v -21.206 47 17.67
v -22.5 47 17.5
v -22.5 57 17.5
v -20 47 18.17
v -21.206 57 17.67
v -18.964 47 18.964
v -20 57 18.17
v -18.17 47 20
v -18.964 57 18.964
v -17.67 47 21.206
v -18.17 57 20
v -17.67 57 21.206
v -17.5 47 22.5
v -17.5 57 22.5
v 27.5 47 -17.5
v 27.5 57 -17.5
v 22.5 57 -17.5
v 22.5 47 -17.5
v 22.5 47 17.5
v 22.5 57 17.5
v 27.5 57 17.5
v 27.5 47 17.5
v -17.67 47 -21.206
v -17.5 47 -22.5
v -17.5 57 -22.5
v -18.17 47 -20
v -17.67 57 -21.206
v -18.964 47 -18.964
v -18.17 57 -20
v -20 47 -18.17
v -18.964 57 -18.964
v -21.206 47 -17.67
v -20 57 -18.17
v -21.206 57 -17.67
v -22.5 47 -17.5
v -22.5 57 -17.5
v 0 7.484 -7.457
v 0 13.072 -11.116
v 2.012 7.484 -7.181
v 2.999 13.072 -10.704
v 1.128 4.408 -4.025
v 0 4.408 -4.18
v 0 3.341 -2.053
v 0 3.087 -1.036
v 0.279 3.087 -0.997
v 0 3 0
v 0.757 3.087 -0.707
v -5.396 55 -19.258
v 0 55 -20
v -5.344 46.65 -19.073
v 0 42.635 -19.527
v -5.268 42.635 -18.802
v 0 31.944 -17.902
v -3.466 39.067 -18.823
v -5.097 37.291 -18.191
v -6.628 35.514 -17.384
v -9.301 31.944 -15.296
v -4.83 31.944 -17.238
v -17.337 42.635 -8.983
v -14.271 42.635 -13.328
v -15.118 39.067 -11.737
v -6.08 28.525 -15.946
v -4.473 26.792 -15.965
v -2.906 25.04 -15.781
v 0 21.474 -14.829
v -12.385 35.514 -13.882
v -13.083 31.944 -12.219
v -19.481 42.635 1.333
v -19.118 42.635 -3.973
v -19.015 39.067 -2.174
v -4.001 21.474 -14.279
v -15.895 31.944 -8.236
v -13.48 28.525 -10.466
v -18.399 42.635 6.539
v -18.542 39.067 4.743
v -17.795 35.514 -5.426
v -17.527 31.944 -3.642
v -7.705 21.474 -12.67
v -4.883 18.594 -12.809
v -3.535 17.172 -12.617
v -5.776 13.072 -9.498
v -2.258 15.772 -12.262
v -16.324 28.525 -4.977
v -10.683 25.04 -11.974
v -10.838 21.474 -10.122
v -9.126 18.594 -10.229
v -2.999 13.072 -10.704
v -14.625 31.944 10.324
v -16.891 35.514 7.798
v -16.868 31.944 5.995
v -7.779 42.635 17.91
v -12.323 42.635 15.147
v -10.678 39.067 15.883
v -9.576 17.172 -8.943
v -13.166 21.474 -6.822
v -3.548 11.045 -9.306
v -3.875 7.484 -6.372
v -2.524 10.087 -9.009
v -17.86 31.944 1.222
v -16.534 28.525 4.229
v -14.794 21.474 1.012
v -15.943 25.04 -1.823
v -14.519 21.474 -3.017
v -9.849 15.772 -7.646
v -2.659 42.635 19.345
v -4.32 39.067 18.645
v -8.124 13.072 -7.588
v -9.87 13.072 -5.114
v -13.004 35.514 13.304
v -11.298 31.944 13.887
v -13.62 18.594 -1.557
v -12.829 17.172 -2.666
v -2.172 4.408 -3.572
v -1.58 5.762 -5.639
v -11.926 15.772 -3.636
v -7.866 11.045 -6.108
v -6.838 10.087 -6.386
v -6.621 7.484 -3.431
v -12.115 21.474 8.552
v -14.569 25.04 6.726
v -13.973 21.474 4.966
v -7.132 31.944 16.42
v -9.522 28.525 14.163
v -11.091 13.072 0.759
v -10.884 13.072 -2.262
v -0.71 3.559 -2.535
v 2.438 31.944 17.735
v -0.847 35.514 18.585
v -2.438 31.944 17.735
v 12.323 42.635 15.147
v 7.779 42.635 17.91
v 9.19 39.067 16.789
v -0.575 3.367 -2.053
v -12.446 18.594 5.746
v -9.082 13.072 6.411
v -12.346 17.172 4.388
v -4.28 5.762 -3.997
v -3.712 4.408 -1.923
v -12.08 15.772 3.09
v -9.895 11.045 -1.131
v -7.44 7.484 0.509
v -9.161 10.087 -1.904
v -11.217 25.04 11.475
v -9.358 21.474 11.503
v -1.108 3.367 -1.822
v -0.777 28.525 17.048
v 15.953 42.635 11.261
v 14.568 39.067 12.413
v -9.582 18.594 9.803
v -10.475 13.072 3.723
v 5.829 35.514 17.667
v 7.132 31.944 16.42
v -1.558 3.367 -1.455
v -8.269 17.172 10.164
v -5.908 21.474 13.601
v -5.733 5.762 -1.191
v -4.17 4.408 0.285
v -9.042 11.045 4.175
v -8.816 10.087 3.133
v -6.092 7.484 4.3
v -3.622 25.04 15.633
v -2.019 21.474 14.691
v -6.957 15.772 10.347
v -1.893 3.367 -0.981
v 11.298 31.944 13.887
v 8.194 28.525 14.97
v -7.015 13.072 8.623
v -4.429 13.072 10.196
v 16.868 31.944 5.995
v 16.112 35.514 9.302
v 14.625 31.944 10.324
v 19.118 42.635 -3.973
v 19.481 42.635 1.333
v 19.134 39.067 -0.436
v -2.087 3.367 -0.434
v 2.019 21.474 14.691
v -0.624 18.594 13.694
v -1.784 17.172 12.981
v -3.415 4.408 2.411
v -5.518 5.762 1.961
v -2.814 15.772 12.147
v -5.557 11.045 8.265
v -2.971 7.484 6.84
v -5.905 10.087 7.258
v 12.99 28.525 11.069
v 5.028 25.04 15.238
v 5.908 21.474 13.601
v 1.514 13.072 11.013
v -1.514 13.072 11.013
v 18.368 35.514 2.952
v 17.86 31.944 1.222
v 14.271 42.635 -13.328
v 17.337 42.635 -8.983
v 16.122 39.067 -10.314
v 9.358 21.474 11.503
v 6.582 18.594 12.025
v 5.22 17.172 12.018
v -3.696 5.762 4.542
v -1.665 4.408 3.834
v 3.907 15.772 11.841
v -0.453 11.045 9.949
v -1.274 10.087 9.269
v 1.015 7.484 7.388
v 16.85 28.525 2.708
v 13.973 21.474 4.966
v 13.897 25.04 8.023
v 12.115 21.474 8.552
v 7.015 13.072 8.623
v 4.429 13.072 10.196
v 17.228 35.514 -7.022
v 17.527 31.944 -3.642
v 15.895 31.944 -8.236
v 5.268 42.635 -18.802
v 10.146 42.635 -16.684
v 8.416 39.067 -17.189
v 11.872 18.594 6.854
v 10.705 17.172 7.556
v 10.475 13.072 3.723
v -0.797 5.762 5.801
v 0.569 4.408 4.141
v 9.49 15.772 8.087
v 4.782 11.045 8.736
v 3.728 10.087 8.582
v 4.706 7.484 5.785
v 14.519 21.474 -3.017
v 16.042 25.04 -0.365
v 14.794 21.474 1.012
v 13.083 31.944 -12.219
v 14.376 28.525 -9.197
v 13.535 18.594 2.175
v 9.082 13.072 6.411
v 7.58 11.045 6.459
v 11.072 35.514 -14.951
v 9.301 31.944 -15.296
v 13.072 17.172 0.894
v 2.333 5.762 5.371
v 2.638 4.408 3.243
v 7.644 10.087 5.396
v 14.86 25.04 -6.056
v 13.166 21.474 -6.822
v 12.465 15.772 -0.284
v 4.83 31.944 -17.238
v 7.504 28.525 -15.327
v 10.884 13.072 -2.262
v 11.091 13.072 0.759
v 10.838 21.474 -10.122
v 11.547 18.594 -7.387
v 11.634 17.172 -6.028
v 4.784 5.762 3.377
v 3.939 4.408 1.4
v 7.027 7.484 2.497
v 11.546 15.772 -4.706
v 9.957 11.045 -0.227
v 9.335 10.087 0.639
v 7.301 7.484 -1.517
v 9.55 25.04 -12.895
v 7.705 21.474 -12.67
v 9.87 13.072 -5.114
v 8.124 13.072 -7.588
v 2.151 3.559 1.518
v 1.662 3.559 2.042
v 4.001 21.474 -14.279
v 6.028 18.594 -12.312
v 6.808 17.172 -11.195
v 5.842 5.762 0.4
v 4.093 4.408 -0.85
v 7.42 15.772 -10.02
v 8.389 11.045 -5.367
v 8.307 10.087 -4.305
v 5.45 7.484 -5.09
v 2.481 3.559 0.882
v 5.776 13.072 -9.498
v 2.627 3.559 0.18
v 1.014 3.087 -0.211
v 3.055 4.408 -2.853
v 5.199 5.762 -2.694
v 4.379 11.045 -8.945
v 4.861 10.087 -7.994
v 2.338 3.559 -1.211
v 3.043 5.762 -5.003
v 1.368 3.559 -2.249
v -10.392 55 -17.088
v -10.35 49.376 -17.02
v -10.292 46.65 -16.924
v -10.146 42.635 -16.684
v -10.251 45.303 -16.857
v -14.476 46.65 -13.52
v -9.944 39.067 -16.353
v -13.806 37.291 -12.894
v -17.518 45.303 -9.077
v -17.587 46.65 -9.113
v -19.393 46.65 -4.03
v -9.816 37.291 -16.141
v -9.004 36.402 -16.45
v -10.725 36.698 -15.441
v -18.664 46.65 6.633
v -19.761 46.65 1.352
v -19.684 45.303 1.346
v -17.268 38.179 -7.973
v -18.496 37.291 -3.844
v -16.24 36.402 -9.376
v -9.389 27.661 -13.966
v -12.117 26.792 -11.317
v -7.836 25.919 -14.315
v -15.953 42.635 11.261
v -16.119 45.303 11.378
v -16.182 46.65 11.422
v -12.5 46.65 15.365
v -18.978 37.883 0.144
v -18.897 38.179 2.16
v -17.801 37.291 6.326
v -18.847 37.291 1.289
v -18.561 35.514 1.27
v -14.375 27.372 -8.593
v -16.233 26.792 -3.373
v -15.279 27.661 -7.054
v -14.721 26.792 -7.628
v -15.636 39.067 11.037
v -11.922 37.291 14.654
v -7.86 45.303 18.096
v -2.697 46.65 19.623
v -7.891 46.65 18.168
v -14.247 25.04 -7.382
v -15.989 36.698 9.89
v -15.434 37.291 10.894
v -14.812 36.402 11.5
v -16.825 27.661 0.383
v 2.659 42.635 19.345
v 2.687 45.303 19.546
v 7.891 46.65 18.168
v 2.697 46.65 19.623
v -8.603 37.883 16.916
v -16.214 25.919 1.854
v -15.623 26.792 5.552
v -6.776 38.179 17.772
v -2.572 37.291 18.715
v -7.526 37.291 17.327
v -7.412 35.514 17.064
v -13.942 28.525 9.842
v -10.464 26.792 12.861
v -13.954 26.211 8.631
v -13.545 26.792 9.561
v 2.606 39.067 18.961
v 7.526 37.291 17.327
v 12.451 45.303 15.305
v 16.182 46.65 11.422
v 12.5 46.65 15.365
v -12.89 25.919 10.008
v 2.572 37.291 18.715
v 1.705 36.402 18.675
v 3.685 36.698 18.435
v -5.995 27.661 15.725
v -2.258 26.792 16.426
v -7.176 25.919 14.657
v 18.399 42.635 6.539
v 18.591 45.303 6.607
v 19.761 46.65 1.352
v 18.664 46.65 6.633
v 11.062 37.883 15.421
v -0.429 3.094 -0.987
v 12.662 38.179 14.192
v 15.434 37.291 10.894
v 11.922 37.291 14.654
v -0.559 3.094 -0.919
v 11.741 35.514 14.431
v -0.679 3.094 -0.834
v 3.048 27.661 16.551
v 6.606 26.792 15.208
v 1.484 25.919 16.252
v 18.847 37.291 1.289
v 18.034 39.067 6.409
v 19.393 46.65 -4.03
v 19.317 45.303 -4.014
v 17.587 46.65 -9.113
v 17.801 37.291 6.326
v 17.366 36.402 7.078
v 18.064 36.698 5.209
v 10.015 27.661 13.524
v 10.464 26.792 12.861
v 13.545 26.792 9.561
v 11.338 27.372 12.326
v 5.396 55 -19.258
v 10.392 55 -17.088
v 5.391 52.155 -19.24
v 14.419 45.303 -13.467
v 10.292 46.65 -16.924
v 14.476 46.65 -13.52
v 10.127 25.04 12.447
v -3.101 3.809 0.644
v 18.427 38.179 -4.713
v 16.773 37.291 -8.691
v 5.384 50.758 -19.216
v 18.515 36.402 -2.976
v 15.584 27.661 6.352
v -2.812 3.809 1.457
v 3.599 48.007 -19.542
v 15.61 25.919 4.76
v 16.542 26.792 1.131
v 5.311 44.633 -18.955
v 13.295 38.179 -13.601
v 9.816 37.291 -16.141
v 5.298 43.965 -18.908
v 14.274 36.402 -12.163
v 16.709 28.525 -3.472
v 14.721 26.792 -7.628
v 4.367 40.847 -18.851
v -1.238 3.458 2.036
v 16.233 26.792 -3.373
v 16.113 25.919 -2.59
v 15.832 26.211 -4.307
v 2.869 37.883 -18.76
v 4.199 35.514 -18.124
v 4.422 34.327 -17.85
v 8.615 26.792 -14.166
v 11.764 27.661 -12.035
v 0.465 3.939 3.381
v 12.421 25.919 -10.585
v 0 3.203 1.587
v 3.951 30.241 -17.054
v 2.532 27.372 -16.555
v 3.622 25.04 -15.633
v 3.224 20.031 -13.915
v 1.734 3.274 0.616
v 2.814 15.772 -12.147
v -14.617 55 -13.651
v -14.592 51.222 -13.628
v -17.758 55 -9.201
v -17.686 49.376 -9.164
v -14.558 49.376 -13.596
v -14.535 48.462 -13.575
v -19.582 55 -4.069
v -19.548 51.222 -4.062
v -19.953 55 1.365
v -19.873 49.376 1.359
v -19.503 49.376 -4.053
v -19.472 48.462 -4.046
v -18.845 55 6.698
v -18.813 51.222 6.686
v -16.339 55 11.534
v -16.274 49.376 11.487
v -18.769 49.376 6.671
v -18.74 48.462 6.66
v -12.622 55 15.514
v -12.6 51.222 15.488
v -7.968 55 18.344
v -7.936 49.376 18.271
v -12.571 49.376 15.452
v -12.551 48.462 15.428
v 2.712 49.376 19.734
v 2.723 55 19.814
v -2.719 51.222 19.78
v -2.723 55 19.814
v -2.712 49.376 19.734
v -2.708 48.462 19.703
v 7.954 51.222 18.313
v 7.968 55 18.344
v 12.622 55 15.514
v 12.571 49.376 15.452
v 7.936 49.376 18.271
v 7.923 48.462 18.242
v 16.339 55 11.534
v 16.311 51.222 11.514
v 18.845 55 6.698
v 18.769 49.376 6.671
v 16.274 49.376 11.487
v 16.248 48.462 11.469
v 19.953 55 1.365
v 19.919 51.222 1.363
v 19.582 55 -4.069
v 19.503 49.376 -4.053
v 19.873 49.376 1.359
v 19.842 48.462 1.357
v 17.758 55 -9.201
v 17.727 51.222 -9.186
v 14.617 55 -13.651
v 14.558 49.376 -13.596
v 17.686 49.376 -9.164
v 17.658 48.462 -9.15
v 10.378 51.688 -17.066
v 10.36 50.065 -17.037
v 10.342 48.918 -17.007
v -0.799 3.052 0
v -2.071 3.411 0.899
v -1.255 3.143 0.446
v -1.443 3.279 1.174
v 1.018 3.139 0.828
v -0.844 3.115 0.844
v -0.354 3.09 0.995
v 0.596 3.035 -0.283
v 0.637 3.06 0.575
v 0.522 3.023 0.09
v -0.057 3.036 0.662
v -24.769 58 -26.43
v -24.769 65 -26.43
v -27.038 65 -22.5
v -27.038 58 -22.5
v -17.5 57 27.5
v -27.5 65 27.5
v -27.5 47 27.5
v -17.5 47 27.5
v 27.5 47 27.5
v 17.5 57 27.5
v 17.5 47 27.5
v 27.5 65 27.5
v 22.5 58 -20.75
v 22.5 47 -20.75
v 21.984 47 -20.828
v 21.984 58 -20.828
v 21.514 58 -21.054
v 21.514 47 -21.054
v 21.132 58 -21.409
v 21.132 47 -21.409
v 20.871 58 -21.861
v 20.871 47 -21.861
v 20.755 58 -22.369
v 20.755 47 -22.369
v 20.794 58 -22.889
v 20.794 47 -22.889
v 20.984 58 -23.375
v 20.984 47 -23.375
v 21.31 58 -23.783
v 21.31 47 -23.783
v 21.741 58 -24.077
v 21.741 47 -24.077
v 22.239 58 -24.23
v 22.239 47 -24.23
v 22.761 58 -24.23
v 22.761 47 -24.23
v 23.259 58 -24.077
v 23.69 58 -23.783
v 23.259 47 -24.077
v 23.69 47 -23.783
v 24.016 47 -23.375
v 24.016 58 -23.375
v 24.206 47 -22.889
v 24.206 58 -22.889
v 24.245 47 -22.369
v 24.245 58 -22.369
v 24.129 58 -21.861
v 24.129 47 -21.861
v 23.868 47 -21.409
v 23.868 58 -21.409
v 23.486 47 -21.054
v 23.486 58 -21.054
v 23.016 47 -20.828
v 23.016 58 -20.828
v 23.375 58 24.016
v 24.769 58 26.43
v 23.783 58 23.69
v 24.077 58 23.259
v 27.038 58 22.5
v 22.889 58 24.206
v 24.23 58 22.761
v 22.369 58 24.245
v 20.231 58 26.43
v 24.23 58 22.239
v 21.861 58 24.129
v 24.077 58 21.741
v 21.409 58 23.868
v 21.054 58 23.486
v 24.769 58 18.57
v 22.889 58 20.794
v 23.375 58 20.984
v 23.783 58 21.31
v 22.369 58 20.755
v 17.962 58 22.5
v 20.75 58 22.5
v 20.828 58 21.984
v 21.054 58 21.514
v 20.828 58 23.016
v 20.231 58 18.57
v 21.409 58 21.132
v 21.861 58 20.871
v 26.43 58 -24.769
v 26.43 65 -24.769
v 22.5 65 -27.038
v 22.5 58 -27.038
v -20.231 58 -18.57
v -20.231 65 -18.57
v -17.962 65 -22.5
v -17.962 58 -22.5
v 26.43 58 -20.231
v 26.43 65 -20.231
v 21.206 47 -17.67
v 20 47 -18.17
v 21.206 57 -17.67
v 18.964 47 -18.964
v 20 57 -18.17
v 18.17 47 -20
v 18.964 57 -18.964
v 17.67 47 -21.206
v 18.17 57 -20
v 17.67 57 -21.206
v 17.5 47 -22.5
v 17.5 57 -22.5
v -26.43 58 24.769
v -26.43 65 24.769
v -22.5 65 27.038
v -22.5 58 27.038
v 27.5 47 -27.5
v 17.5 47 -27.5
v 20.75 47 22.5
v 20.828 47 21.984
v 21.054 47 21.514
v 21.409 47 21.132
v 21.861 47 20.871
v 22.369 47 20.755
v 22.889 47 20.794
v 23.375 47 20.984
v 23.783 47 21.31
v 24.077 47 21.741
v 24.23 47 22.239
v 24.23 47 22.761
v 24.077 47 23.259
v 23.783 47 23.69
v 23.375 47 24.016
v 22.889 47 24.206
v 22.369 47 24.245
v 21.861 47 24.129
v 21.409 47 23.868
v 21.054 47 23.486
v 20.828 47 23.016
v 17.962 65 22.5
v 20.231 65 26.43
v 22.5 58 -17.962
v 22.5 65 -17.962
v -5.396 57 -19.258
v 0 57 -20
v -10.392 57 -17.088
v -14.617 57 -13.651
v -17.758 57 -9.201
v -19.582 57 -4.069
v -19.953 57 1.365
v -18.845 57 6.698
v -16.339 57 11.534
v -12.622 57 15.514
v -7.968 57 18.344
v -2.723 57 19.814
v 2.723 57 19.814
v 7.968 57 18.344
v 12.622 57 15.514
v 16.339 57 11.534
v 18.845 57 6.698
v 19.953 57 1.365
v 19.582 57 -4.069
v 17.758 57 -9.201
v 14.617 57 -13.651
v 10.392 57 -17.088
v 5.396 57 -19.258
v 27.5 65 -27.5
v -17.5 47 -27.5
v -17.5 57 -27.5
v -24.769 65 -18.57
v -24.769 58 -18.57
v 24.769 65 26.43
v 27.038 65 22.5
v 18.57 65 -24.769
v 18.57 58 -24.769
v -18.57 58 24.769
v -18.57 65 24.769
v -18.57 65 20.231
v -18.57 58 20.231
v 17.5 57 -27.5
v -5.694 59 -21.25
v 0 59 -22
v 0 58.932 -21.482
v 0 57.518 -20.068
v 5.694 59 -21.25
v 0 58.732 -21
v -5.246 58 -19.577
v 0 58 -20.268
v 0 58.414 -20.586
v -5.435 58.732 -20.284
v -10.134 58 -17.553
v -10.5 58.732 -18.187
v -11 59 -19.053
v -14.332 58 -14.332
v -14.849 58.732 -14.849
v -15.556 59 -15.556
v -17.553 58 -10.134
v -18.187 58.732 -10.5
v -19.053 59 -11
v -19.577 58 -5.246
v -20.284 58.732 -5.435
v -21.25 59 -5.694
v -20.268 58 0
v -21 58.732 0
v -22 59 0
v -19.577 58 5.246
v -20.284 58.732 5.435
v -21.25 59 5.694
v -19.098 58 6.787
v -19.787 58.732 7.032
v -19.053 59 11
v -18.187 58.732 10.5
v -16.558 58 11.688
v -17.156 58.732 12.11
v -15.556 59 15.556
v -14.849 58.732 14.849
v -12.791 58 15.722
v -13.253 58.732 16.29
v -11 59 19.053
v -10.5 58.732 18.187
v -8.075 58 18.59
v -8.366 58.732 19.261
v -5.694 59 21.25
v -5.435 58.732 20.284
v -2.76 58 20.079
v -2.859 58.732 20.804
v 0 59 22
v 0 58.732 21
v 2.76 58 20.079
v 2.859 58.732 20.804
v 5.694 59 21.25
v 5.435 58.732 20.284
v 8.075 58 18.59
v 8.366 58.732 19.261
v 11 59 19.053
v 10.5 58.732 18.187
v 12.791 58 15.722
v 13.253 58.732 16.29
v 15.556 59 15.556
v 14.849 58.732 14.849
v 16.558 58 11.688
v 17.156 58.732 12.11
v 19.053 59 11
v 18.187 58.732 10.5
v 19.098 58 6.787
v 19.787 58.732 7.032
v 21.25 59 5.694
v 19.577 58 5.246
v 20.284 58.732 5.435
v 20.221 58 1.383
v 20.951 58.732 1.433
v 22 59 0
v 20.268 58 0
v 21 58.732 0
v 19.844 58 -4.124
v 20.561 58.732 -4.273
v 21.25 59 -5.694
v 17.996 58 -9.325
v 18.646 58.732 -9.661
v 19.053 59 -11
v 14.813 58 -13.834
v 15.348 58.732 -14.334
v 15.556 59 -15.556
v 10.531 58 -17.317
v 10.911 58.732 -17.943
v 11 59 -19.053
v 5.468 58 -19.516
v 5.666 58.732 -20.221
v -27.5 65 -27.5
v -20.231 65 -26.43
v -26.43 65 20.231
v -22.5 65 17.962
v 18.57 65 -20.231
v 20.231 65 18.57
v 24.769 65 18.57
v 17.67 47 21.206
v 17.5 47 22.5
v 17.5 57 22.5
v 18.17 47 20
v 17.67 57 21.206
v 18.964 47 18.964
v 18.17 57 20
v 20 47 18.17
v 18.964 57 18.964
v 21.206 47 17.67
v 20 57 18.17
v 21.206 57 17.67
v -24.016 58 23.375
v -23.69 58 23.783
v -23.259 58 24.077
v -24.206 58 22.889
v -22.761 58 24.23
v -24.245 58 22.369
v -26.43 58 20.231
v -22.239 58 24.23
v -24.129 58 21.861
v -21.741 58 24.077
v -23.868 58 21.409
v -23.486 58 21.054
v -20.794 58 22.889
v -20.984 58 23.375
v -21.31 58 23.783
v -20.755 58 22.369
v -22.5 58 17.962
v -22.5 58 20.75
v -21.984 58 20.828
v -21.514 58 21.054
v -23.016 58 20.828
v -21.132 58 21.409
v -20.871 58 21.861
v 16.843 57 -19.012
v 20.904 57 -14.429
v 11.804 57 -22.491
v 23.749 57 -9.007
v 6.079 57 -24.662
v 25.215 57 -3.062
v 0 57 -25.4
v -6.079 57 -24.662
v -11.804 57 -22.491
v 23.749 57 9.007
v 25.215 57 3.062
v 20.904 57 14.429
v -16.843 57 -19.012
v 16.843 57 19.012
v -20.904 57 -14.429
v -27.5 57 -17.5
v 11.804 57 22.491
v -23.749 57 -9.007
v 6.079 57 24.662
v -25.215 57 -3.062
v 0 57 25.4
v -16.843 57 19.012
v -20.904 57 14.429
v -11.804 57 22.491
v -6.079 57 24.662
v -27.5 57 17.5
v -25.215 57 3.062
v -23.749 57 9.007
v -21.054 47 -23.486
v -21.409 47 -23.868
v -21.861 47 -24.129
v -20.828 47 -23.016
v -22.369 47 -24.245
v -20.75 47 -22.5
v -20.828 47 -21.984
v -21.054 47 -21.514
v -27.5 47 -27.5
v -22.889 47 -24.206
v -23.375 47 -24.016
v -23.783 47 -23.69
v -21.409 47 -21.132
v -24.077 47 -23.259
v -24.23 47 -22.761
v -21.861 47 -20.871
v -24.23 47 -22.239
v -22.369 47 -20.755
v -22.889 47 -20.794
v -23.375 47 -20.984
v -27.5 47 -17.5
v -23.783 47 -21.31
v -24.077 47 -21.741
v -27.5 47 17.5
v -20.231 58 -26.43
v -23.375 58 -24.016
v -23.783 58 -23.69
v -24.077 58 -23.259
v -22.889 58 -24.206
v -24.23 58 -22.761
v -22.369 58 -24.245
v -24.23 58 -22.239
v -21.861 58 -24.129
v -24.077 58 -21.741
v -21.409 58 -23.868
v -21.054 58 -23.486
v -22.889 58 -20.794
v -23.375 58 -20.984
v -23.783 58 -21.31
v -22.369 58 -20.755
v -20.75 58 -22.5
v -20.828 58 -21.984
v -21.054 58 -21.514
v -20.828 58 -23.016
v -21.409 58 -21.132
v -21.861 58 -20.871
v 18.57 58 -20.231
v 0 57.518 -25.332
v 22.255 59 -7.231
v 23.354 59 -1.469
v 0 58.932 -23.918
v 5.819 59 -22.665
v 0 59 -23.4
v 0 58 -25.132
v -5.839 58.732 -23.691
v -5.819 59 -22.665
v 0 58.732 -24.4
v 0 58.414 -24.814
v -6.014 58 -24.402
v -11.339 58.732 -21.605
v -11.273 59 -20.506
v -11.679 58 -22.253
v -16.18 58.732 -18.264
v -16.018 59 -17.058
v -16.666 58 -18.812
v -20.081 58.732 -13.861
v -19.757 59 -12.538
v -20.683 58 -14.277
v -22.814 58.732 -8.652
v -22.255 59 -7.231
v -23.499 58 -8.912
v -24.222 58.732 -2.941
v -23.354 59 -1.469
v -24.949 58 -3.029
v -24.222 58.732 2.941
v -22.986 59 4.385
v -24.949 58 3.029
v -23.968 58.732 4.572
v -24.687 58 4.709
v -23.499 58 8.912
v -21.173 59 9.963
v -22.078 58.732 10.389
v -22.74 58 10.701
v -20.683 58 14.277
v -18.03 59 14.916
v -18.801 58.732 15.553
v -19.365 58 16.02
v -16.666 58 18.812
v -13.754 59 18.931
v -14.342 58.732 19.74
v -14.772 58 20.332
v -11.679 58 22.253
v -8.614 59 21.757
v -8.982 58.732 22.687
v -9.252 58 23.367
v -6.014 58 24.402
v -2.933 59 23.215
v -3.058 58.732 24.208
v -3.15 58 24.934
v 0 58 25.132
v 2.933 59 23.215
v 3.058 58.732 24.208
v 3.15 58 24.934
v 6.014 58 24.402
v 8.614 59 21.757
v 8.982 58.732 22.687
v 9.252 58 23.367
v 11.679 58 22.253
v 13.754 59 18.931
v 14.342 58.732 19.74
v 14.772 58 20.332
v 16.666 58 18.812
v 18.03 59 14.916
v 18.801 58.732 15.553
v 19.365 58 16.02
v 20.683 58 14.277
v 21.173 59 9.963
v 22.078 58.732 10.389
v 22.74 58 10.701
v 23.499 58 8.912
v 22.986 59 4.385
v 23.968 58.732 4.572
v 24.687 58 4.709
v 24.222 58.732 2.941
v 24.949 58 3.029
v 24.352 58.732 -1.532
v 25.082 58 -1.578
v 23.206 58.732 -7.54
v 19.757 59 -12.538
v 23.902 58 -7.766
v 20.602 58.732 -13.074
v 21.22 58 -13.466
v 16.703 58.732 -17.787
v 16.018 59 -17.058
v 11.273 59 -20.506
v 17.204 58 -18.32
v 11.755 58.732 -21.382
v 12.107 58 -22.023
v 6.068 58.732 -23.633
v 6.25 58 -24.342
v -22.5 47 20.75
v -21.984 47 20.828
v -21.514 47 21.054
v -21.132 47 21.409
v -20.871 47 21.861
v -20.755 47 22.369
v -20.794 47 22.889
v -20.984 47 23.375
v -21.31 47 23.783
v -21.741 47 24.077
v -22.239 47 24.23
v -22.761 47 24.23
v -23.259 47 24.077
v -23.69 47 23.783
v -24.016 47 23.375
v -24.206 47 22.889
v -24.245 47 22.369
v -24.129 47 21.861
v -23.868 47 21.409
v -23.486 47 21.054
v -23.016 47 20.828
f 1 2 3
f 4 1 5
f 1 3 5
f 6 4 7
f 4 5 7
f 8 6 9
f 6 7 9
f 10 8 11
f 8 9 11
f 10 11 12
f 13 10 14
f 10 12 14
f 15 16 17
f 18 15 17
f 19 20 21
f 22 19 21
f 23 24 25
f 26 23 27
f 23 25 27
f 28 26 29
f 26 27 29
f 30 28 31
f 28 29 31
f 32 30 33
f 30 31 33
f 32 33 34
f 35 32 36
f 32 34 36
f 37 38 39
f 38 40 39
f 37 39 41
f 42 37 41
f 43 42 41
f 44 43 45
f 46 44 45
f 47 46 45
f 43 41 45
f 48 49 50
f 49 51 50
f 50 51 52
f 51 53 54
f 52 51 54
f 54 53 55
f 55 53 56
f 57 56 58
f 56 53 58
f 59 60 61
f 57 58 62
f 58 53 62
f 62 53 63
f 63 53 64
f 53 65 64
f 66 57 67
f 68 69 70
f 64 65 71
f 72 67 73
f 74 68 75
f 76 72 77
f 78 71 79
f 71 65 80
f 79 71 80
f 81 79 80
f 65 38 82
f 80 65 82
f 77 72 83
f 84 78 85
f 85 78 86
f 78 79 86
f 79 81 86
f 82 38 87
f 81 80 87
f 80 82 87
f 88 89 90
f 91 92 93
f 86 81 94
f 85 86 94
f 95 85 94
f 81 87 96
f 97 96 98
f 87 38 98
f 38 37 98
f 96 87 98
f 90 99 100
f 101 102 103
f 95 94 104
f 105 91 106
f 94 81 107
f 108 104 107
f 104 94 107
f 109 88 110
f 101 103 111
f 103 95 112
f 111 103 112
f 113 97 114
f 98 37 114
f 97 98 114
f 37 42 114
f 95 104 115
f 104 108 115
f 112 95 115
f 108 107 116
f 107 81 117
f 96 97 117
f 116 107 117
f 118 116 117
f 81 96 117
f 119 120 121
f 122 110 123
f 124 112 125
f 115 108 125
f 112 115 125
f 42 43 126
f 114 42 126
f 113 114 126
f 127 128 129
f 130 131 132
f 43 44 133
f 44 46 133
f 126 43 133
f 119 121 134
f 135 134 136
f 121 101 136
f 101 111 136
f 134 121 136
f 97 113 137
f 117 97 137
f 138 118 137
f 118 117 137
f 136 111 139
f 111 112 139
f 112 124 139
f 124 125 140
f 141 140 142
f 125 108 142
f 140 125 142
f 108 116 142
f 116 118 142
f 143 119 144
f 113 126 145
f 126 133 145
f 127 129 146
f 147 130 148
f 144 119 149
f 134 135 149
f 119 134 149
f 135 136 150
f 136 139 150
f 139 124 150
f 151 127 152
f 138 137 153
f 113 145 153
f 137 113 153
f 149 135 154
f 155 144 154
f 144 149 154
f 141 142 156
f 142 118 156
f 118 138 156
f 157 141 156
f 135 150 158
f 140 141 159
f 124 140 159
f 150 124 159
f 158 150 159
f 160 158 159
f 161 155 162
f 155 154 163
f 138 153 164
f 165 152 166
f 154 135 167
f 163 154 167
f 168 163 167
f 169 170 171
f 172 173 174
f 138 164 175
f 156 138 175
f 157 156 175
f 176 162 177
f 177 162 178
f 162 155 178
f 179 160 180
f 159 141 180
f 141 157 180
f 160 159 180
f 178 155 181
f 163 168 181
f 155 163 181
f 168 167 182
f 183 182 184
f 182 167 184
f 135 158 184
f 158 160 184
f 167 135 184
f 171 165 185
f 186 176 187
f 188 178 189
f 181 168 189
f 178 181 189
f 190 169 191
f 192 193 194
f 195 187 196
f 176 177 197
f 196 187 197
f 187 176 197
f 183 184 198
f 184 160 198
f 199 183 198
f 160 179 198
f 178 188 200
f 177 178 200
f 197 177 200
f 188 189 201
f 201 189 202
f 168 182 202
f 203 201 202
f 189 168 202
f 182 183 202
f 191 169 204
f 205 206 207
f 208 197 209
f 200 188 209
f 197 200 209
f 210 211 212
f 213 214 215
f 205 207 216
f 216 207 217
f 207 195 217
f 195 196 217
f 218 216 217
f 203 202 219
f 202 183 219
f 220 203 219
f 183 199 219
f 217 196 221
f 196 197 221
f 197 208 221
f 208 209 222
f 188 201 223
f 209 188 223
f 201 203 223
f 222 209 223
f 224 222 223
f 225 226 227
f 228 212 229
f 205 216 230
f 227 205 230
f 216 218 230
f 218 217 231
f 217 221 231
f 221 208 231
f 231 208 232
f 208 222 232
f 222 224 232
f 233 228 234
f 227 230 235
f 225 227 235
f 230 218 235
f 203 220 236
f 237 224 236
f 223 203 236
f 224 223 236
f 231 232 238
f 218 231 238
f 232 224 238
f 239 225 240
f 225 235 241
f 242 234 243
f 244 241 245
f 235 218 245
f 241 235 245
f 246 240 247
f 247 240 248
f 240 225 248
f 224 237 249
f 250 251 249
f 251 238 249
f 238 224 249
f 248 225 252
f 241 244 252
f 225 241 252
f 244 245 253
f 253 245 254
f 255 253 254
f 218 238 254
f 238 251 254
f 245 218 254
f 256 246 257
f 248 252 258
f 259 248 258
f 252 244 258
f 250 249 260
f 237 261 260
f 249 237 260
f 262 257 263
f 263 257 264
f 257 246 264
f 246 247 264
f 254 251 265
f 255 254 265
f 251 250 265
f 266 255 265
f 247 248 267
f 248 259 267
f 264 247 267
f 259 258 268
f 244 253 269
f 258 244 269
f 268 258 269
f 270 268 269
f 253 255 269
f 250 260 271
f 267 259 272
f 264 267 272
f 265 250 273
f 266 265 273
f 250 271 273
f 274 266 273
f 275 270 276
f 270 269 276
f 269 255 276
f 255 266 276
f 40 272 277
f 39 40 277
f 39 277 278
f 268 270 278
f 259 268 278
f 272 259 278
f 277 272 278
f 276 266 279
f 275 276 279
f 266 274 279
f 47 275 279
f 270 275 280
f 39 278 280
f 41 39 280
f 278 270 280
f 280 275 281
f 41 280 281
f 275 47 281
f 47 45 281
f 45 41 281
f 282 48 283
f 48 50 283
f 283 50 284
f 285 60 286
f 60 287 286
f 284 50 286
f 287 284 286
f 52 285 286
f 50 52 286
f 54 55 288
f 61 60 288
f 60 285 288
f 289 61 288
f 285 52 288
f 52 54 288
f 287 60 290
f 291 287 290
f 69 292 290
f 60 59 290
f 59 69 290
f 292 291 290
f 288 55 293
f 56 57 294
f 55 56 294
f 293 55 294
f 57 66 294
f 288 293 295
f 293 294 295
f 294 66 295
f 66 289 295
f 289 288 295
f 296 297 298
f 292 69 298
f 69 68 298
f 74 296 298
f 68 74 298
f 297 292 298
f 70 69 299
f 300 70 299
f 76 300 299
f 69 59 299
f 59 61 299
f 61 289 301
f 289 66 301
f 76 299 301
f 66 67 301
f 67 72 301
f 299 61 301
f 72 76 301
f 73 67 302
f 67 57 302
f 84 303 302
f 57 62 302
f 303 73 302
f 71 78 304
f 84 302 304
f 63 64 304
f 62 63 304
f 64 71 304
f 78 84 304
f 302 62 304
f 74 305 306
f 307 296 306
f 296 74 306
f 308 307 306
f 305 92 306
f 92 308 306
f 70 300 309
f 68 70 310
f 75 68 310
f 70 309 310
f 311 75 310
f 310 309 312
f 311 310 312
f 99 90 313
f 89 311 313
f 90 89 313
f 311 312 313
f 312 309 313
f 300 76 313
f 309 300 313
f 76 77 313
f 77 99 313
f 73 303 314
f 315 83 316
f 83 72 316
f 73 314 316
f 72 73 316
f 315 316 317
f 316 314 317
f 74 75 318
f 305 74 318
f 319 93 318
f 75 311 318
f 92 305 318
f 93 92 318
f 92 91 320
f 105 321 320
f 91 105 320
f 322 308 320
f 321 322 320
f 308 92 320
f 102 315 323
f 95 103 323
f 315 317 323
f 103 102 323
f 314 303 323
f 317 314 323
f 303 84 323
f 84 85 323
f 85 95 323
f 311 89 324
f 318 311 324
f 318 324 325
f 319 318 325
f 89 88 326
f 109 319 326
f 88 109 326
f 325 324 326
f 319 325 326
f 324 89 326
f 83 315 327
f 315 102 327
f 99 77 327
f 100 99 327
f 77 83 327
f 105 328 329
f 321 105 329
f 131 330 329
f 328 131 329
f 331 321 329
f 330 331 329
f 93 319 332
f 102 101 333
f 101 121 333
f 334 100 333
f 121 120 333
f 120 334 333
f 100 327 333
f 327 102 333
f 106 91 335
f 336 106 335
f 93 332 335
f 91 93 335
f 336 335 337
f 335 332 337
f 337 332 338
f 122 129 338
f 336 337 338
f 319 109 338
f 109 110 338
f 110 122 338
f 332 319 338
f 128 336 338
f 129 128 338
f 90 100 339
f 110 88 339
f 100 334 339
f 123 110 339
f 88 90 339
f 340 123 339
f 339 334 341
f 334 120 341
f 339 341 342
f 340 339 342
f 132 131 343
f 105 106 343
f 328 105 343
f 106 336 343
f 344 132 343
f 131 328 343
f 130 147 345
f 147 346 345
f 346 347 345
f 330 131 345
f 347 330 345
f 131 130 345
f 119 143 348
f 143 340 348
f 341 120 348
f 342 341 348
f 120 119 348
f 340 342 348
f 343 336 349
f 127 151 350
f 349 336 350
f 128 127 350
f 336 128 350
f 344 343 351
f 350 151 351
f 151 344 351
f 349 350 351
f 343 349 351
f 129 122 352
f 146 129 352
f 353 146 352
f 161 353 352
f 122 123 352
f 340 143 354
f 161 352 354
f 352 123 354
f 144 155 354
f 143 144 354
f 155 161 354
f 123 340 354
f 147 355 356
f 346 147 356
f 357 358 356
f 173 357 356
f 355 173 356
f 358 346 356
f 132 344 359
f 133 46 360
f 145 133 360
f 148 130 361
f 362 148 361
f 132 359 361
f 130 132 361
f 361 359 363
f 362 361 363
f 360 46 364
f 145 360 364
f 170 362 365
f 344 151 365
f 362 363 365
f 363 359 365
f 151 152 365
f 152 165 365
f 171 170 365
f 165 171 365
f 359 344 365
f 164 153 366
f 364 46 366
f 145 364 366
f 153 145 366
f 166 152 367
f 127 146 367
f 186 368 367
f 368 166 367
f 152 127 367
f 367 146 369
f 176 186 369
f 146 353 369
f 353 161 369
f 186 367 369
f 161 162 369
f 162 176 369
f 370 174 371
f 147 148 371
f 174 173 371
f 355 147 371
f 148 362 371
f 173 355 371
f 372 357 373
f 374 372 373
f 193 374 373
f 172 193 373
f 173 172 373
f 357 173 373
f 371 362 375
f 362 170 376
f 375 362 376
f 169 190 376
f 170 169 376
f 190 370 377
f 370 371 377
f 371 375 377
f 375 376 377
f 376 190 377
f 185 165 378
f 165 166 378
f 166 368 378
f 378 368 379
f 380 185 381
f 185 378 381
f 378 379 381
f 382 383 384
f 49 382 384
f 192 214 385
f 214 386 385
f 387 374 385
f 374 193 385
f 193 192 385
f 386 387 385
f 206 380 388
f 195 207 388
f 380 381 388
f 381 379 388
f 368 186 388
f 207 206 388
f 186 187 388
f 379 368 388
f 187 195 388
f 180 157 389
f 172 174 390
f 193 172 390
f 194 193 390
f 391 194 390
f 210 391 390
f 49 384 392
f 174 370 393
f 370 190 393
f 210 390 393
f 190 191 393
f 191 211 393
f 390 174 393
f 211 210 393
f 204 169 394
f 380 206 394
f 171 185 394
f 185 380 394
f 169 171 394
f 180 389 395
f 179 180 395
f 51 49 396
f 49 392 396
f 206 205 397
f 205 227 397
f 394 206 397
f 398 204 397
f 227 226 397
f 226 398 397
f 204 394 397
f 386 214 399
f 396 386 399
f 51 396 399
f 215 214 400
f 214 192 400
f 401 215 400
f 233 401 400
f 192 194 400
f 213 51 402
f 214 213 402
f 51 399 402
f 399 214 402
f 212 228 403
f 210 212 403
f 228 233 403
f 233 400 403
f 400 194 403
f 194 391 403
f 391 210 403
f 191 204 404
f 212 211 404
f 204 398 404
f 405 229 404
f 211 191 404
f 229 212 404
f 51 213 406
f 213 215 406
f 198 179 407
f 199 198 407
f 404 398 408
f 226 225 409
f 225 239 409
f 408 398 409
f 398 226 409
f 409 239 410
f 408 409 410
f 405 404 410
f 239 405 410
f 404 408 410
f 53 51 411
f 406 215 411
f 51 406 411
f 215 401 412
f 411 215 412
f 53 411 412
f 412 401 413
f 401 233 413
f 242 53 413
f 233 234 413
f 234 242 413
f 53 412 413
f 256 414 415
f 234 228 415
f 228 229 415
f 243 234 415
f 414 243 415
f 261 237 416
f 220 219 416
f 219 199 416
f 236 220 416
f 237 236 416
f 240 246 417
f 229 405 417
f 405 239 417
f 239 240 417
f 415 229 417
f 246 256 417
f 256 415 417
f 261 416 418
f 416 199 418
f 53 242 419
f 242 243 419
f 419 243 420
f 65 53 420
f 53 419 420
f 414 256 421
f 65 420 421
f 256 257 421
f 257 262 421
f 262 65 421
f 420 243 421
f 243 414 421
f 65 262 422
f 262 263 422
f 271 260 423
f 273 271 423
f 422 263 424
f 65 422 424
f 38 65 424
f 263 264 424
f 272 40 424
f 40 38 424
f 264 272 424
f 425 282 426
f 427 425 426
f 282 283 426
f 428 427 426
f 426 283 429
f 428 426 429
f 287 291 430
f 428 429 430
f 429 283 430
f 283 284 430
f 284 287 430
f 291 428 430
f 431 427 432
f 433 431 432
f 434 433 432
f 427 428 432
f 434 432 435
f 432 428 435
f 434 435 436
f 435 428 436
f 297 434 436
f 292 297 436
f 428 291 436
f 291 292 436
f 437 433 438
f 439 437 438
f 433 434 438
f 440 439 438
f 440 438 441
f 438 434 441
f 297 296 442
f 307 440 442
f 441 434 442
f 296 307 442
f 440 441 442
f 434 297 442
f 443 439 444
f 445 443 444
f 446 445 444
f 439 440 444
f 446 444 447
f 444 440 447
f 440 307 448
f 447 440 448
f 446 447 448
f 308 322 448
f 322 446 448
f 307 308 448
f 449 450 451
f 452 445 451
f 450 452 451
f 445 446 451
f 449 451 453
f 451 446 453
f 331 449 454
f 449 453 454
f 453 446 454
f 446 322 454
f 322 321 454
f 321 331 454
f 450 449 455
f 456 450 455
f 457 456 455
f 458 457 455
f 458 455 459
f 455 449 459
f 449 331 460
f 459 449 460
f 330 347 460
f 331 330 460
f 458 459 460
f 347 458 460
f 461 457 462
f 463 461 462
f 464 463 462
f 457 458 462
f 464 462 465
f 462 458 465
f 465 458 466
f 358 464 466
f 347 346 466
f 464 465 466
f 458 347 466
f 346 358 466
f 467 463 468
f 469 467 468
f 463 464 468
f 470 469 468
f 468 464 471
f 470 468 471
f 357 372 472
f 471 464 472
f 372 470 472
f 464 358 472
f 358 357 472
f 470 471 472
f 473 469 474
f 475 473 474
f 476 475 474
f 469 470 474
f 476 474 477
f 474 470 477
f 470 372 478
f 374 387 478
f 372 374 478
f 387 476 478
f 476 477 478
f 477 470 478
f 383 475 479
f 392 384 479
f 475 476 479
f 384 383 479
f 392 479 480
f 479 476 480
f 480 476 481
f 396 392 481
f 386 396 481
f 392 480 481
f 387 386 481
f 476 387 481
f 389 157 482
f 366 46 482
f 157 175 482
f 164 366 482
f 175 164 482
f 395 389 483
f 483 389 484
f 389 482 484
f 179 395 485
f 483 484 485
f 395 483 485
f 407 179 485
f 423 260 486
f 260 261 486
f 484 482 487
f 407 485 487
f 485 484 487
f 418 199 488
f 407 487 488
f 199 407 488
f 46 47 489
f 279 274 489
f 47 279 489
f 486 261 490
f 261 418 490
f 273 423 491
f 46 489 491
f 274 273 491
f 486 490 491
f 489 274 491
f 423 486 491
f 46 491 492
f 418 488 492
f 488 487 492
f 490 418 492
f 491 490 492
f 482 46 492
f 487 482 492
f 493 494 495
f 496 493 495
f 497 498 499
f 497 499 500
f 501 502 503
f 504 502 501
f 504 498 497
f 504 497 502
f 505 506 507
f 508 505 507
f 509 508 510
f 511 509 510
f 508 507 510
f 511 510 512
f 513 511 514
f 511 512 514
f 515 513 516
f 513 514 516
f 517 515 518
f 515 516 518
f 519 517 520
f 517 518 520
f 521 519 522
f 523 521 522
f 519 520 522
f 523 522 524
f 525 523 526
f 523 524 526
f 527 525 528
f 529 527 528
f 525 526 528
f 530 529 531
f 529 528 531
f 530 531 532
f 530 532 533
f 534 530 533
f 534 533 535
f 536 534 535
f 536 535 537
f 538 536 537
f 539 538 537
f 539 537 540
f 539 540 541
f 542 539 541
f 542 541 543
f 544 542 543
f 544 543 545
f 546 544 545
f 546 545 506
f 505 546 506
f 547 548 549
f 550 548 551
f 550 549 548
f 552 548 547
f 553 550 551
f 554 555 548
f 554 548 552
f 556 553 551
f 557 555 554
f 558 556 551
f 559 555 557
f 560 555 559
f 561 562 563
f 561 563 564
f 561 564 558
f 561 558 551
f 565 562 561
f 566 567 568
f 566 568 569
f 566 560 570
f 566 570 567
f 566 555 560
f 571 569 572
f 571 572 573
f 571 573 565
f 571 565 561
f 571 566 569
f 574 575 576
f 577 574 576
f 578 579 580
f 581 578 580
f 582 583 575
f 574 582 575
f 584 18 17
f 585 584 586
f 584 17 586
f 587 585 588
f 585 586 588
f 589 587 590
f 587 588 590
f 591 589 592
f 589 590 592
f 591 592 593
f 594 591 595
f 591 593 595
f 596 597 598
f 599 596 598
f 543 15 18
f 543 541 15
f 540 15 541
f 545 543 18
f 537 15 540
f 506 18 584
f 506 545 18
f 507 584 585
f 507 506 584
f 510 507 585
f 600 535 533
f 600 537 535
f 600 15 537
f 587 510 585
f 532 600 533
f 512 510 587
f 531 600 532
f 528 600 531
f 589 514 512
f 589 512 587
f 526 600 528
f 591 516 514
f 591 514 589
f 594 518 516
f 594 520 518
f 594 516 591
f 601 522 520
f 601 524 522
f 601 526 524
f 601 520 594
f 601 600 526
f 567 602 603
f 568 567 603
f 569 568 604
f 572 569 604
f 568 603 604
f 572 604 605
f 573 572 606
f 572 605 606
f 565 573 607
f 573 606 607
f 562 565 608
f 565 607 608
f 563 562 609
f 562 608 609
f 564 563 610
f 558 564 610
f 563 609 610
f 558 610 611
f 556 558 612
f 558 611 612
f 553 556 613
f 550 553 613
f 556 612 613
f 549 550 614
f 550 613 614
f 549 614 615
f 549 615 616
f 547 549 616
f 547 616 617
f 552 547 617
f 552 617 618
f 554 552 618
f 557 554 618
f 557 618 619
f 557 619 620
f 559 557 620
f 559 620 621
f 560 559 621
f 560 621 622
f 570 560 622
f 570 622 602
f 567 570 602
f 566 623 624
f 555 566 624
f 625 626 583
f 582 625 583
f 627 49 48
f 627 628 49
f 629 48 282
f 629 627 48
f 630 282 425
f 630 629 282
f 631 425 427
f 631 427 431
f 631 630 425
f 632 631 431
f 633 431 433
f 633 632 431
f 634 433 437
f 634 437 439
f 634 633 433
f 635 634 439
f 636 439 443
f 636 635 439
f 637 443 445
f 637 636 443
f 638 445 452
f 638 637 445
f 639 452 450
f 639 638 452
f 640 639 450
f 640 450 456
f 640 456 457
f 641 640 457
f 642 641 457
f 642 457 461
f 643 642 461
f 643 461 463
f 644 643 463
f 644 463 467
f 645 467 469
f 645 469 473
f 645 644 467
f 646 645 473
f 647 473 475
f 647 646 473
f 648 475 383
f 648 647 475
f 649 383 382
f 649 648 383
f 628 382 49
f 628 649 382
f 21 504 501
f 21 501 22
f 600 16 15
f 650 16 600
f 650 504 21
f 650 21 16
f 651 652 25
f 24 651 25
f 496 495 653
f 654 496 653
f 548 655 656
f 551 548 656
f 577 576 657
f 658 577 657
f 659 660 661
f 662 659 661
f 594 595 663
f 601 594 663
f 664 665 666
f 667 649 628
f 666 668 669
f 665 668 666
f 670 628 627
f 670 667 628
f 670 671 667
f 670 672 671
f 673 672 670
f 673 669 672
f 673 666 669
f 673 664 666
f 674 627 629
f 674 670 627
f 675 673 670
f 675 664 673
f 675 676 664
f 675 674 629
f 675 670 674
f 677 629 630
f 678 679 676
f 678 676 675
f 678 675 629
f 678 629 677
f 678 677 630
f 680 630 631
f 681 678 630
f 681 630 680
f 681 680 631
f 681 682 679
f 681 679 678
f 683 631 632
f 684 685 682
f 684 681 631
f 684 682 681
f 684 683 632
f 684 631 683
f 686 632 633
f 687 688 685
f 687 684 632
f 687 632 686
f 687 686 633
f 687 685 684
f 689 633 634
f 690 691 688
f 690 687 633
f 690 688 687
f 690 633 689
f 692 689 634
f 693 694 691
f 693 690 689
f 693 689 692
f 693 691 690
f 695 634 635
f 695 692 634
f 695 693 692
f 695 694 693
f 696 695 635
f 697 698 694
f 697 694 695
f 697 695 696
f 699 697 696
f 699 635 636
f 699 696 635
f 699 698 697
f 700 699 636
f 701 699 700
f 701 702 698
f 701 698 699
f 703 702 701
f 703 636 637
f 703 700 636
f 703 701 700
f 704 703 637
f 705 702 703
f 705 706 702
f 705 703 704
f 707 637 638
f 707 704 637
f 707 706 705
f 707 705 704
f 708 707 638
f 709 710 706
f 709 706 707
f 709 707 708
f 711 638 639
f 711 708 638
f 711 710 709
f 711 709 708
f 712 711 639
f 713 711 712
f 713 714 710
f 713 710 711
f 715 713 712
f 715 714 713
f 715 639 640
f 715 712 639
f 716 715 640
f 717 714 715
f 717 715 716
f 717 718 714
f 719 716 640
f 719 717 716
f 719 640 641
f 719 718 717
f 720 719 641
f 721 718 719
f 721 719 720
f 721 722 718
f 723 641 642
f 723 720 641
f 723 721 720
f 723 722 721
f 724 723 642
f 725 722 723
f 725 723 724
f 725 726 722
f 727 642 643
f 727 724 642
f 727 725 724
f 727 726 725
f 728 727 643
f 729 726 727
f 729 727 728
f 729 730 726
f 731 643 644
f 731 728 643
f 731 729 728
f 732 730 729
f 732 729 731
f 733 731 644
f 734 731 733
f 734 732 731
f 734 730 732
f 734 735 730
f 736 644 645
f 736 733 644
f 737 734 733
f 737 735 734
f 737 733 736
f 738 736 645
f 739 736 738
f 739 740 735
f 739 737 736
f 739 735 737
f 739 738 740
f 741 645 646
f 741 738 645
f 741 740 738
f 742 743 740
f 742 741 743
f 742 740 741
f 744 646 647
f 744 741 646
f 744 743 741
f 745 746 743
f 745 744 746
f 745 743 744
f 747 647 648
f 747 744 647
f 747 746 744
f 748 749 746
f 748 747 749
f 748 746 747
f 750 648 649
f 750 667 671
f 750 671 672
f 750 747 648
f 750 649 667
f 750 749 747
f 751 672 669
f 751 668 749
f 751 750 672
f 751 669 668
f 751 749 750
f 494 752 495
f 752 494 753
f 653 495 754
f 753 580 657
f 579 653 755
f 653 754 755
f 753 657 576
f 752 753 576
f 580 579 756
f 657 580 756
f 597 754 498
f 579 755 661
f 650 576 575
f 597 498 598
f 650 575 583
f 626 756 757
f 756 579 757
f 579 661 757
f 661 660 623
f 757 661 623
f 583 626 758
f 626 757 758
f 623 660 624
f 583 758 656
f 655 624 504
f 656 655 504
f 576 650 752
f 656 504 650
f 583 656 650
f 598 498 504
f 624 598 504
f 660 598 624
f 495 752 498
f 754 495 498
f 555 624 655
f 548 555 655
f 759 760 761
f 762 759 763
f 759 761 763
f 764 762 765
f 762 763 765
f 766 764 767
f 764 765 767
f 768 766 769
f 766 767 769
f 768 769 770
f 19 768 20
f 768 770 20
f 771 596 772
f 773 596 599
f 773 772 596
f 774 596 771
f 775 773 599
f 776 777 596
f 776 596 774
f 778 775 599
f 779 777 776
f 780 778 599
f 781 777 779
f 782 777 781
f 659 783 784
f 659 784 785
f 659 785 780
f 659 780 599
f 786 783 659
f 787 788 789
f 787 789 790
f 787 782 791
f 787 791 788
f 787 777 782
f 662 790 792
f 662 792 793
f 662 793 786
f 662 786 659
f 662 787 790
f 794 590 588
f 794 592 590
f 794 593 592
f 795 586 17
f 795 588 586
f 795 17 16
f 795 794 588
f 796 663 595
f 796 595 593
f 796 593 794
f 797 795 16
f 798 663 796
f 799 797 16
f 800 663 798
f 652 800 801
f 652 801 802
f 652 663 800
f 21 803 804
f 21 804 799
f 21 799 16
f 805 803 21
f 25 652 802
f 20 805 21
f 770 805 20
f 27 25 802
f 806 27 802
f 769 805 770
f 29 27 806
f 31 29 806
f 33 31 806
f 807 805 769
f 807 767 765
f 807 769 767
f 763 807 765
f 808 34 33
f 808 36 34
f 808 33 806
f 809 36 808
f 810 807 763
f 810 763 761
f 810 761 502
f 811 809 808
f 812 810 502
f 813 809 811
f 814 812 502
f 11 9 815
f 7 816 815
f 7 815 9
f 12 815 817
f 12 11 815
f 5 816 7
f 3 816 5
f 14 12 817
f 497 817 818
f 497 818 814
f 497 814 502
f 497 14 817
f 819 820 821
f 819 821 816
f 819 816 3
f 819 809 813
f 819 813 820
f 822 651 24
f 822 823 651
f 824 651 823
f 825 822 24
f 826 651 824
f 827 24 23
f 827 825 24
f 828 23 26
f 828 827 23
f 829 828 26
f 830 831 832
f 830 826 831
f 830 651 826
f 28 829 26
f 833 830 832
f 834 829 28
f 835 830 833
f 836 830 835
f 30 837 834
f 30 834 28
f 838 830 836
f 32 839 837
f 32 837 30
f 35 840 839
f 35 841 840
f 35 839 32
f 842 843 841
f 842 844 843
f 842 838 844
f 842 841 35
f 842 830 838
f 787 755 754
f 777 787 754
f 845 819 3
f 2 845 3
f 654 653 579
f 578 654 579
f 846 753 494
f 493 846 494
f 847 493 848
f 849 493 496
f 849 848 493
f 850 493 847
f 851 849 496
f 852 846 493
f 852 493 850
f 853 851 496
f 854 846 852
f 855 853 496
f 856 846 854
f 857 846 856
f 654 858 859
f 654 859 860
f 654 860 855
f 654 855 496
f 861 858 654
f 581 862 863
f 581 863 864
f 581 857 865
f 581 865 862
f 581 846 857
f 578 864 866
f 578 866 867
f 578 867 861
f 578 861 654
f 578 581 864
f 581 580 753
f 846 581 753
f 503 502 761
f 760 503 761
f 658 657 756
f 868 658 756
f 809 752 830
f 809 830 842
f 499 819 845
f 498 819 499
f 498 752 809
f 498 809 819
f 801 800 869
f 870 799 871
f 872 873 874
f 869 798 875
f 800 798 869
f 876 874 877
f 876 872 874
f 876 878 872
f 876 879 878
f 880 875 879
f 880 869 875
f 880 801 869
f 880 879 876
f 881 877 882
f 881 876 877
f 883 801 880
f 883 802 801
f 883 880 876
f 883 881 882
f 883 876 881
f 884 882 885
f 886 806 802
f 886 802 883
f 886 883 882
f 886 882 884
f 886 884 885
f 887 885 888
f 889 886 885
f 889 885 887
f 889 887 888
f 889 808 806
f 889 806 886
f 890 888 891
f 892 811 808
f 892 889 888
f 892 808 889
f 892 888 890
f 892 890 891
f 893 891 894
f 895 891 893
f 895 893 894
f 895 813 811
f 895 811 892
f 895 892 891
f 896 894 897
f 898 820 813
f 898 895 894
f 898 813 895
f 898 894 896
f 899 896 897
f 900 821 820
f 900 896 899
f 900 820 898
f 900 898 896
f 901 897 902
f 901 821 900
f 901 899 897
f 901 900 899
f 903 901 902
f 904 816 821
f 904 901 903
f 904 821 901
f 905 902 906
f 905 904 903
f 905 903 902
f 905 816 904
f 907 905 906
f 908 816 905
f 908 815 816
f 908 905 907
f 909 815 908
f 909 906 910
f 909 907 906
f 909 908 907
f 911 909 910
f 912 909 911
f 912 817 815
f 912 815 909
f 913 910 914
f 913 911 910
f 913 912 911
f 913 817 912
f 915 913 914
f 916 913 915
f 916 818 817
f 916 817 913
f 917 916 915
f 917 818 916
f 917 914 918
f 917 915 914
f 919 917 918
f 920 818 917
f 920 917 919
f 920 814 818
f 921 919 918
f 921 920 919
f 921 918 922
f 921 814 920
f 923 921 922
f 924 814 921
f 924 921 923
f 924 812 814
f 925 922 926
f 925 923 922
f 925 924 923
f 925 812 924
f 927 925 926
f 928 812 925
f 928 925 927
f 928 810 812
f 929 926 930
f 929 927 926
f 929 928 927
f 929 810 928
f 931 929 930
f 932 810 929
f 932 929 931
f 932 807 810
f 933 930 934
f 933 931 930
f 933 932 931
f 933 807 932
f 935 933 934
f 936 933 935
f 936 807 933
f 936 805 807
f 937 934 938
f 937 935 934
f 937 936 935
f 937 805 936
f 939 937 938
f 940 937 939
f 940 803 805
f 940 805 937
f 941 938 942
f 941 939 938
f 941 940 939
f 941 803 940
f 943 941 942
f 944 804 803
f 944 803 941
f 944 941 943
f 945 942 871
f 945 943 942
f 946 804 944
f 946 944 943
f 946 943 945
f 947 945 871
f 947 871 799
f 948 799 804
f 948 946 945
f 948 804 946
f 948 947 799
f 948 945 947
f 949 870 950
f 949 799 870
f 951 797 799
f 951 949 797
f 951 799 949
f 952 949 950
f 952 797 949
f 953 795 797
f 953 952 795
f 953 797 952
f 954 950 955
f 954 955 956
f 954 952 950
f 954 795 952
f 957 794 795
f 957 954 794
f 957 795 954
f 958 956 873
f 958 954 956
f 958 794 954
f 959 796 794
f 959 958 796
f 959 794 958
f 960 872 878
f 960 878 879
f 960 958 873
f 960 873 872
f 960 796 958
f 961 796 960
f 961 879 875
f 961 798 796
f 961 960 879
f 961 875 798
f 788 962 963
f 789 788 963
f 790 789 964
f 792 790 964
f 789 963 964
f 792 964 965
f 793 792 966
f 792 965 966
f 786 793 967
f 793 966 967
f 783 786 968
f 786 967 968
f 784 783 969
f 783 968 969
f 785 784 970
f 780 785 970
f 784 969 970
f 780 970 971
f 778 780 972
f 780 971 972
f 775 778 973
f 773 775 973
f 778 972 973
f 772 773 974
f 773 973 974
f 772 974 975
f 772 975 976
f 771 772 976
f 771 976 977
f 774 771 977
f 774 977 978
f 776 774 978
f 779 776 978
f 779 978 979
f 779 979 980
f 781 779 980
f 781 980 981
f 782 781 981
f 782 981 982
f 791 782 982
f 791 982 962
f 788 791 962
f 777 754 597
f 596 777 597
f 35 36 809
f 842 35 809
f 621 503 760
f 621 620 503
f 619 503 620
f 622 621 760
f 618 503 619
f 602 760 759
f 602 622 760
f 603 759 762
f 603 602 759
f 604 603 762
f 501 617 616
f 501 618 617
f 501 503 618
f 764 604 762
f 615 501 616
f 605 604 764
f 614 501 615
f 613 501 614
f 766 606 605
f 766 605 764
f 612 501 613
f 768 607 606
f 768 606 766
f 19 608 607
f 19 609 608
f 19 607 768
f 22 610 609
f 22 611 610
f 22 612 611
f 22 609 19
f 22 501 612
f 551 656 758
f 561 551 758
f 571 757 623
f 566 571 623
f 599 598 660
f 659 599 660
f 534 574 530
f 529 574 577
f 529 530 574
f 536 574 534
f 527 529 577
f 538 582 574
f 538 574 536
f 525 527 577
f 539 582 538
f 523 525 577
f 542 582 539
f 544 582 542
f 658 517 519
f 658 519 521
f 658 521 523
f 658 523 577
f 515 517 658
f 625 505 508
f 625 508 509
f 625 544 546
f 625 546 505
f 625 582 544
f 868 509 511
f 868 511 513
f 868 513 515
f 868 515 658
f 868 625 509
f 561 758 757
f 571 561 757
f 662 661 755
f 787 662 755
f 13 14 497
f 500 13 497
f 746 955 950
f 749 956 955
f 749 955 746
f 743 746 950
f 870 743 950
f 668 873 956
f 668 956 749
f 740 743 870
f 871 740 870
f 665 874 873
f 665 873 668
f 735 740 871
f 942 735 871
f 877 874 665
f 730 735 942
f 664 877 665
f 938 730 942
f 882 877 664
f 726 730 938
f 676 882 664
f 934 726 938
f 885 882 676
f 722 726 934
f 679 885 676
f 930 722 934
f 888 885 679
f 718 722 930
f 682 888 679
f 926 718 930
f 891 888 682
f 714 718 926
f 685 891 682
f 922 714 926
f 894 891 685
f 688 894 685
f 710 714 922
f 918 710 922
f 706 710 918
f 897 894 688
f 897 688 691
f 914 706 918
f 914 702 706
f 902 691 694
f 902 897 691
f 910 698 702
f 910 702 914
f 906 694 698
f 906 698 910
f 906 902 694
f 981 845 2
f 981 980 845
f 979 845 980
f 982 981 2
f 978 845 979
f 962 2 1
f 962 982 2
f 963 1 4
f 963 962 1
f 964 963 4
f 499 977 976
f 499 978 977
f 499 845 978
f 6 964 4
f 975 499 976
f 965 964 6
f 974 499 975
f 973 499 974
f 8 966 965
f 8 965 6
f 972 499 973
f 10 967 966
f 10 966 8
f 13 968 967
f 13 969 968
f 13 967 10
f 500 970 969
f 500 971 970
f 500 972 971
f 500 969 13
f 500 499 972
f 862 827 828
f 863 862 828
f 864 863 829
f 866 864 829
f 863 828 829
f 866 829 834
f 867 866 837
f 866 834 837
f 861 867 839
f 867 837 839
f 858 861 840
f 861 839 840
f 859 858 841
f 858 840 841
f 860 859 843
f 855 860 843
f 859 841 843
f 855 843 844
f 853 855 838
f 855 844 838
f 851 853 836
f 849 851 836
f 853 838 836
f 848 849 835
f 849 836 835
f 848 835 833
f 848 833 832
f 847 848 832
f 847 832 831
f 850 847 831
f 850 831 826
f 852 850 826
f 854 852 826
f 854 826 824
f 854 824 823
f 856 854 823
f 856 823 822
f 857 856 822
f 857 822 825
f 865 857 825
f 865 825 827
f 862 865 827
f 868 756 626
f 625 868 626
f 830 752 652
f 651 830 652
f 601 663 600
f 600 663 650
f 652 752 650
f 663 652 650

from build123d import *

# Parameters (mm, degrees)
SKETCH5_W           = 55
SKETCH5_H           = 70
BOSS_EXTRUDE8_DEPTH = 27.5
SKETCH6_W           = 10
SKETCH6_H           = 10
BOSS_EXTRUDE9_DEPTH = 10
SKETCH7_R           = 1.75
CUT_EXTRUDE2_DEPTH  = 59.723930461
CUT_EXTRUDE3_DEPTH  = 7
CIRPATTERN1_COUNT   = 4
FILLET1_R           = 5


with BuildPart() as part:
    # Sketch5 → Boss-Extrude8 (new, symmetric)
    with BuildSketch(Plane.XY):
        with Locations((0, 30)):
            Rectangle(SKETCH5_W, SKETCH5_H)
    extrude(amount=BOSS_EXTRUDE8_DEPTH, both=True)

    # Sketch1 → Cut-Revolve1 (revolve, cut)
    with BuildSketch(Plane(origin=(0, 0, 0), x_dir=(0, 0, -1), z_dir=(1, 0, 0))):
        with BuildLine():
            Line((0, -7), (0, 3))
            add(Edge.make_bspline(
                [(20, 55), (20, 43.957678864), (18.5157836, 25.942674232), (6.738040747, 3), (0, 3)],
                knots=[0, 0, 0, 0, 0.518417095, 1, 1, 1, 1], degree=3))
            Line((20, 55), (20, 57))
            ThreePointArc((20, 57), (20.585786438, 58.414213562), (22, 59))
            Line((22, 59), (23.4, 59))
            ThreePointArc((23.4, 59), (24.814213562, 58.414213562), (25.4, 57))
            Line((25.4, 57), (304.80691679, 57))
            Line((304.80691679, 57), (304.80691679, -311.267440696))
            Line((304.80691679, -311.267440696), (0, -311.267440696))
            Line((0, -311.267440696), (0, -7))
        make_face()
    revolve(axis=Axis((0, 0, 0), (0, 1, 0)), mode=Mode.SUBTRACT)

    # Sketch6 → Boss-Extrude9 (add)
    with BuildSketch(Plane.XZ.offset(-57)):
        with Locations((-22.5, 22.5)):
            Rectangle(SKETCH6_W, SKETCH6_H)
    boss_extrude9 = extrude(amount=BOSS_EXTRUDE9_DEPTH)

    # Sketch7 → Cut-Extrude2 (cut, through all)
    with BuildSketch(Plane.XZ.offset(-47)):
        with Locations(Location((-22.5, 22.5, 0), (0, 0, 270))):
            Circle(SKETCH7_R)
    cut_extrude2 = extrude(amount=-CUT_EXTRUDE2_DEPTH, mode=Mode.SUBTRACT)

    # Sketch8 → Cut-Extrude3 (cut)
    with BuildSketch(Plane(origin=(0, 65, 0), x_dir=(1, 0, 0), z_dir=(0, 1, 0))):
        Polygon((-22.5, -17.962026884), (-26.43, -20.231013442), (-26.43, -24.768986558), (-22.5, -27.037973116), (-18.57, -24.768986558), (-18.57, -20.231013442), align=None)
    cut_extrude3 = extrude(amount=-CUT_EXTRUDE3_DEPTH, mode=Mode.SUBTRACT)

    # CirPattern1: Boss-Extrude9, Cut-Extrude2, Cut-Extrude3 ×4 about axis
    cirpattern1_axis = Axis((0, 0, 0), (0, 1, 0))
    add([boss_extrude9.rotate(cirpattern1_axis, i * 360 / CIRPATTERN1_COUNT) for i in range(1, CIRPATTERN1_COUNT)])
    add([cut_extrude2.rotate(cirpattern1_axis, i * 360 / CIRPATTERN1_COUNT) for i in range(1, CIRPATTERN1_COUNT)], mode=Mode.SUBTRACT)
    add([cut_extrude3.rotate(cirpattern1_axis, i * 360 / CIRPATTERN1_COUNT) for i in range(1, CIRPATTERN1_COUNT)], mode=Mode.SUBTRACT)

    # Fillet1
    # the kernel refuses this fillet: 5 mm, written as the material it takes off along each edge
    with BuildSketch(Plane(origin=(-17.5, 57, 17.5), x_dir=(0, 0, 1), z_dir=(0, -1, 0)), Plane(origin=(17.5, 57, 17.5), x_dir=(1, 0, 0), z_dir=(0, -1, 0))) as fillet1_piece_1:
        with BuildLine():
            CenterArc((FILLET1_R, FILLET1_R), FILLET1_R, 180, 90)
            Line((0, FILLET1_R), (0, 0))
            Line((0, 0), (FILLET1_R, 0))
        make_face()
    extrude(amount=22.5, mode=Mode.SUBTRACT)
    with BuildSketch(Plane(origin=(-17.5, 57, -17.5), x_dir=(0, 0, -1), z_dir=(0, -1, 0)), Plane(origin=(17.5, 57, -17.5), x_dir=(1, 0, 0), z_dir=(0, -1, 0))) as fillet1_piece_2:
        with BuildLine():
            CenterArc((FILLET1_R, -FILLET1_R), FILLET1_R, 90, 90)
            Line((0, -FILLET1_R), (0, 0))
            Line((0, 0), (FILLET1_R, 0))
        make_face()
    extrude(amount=22.5, mode=Mode.SUBTRACT)


solid = part.part
